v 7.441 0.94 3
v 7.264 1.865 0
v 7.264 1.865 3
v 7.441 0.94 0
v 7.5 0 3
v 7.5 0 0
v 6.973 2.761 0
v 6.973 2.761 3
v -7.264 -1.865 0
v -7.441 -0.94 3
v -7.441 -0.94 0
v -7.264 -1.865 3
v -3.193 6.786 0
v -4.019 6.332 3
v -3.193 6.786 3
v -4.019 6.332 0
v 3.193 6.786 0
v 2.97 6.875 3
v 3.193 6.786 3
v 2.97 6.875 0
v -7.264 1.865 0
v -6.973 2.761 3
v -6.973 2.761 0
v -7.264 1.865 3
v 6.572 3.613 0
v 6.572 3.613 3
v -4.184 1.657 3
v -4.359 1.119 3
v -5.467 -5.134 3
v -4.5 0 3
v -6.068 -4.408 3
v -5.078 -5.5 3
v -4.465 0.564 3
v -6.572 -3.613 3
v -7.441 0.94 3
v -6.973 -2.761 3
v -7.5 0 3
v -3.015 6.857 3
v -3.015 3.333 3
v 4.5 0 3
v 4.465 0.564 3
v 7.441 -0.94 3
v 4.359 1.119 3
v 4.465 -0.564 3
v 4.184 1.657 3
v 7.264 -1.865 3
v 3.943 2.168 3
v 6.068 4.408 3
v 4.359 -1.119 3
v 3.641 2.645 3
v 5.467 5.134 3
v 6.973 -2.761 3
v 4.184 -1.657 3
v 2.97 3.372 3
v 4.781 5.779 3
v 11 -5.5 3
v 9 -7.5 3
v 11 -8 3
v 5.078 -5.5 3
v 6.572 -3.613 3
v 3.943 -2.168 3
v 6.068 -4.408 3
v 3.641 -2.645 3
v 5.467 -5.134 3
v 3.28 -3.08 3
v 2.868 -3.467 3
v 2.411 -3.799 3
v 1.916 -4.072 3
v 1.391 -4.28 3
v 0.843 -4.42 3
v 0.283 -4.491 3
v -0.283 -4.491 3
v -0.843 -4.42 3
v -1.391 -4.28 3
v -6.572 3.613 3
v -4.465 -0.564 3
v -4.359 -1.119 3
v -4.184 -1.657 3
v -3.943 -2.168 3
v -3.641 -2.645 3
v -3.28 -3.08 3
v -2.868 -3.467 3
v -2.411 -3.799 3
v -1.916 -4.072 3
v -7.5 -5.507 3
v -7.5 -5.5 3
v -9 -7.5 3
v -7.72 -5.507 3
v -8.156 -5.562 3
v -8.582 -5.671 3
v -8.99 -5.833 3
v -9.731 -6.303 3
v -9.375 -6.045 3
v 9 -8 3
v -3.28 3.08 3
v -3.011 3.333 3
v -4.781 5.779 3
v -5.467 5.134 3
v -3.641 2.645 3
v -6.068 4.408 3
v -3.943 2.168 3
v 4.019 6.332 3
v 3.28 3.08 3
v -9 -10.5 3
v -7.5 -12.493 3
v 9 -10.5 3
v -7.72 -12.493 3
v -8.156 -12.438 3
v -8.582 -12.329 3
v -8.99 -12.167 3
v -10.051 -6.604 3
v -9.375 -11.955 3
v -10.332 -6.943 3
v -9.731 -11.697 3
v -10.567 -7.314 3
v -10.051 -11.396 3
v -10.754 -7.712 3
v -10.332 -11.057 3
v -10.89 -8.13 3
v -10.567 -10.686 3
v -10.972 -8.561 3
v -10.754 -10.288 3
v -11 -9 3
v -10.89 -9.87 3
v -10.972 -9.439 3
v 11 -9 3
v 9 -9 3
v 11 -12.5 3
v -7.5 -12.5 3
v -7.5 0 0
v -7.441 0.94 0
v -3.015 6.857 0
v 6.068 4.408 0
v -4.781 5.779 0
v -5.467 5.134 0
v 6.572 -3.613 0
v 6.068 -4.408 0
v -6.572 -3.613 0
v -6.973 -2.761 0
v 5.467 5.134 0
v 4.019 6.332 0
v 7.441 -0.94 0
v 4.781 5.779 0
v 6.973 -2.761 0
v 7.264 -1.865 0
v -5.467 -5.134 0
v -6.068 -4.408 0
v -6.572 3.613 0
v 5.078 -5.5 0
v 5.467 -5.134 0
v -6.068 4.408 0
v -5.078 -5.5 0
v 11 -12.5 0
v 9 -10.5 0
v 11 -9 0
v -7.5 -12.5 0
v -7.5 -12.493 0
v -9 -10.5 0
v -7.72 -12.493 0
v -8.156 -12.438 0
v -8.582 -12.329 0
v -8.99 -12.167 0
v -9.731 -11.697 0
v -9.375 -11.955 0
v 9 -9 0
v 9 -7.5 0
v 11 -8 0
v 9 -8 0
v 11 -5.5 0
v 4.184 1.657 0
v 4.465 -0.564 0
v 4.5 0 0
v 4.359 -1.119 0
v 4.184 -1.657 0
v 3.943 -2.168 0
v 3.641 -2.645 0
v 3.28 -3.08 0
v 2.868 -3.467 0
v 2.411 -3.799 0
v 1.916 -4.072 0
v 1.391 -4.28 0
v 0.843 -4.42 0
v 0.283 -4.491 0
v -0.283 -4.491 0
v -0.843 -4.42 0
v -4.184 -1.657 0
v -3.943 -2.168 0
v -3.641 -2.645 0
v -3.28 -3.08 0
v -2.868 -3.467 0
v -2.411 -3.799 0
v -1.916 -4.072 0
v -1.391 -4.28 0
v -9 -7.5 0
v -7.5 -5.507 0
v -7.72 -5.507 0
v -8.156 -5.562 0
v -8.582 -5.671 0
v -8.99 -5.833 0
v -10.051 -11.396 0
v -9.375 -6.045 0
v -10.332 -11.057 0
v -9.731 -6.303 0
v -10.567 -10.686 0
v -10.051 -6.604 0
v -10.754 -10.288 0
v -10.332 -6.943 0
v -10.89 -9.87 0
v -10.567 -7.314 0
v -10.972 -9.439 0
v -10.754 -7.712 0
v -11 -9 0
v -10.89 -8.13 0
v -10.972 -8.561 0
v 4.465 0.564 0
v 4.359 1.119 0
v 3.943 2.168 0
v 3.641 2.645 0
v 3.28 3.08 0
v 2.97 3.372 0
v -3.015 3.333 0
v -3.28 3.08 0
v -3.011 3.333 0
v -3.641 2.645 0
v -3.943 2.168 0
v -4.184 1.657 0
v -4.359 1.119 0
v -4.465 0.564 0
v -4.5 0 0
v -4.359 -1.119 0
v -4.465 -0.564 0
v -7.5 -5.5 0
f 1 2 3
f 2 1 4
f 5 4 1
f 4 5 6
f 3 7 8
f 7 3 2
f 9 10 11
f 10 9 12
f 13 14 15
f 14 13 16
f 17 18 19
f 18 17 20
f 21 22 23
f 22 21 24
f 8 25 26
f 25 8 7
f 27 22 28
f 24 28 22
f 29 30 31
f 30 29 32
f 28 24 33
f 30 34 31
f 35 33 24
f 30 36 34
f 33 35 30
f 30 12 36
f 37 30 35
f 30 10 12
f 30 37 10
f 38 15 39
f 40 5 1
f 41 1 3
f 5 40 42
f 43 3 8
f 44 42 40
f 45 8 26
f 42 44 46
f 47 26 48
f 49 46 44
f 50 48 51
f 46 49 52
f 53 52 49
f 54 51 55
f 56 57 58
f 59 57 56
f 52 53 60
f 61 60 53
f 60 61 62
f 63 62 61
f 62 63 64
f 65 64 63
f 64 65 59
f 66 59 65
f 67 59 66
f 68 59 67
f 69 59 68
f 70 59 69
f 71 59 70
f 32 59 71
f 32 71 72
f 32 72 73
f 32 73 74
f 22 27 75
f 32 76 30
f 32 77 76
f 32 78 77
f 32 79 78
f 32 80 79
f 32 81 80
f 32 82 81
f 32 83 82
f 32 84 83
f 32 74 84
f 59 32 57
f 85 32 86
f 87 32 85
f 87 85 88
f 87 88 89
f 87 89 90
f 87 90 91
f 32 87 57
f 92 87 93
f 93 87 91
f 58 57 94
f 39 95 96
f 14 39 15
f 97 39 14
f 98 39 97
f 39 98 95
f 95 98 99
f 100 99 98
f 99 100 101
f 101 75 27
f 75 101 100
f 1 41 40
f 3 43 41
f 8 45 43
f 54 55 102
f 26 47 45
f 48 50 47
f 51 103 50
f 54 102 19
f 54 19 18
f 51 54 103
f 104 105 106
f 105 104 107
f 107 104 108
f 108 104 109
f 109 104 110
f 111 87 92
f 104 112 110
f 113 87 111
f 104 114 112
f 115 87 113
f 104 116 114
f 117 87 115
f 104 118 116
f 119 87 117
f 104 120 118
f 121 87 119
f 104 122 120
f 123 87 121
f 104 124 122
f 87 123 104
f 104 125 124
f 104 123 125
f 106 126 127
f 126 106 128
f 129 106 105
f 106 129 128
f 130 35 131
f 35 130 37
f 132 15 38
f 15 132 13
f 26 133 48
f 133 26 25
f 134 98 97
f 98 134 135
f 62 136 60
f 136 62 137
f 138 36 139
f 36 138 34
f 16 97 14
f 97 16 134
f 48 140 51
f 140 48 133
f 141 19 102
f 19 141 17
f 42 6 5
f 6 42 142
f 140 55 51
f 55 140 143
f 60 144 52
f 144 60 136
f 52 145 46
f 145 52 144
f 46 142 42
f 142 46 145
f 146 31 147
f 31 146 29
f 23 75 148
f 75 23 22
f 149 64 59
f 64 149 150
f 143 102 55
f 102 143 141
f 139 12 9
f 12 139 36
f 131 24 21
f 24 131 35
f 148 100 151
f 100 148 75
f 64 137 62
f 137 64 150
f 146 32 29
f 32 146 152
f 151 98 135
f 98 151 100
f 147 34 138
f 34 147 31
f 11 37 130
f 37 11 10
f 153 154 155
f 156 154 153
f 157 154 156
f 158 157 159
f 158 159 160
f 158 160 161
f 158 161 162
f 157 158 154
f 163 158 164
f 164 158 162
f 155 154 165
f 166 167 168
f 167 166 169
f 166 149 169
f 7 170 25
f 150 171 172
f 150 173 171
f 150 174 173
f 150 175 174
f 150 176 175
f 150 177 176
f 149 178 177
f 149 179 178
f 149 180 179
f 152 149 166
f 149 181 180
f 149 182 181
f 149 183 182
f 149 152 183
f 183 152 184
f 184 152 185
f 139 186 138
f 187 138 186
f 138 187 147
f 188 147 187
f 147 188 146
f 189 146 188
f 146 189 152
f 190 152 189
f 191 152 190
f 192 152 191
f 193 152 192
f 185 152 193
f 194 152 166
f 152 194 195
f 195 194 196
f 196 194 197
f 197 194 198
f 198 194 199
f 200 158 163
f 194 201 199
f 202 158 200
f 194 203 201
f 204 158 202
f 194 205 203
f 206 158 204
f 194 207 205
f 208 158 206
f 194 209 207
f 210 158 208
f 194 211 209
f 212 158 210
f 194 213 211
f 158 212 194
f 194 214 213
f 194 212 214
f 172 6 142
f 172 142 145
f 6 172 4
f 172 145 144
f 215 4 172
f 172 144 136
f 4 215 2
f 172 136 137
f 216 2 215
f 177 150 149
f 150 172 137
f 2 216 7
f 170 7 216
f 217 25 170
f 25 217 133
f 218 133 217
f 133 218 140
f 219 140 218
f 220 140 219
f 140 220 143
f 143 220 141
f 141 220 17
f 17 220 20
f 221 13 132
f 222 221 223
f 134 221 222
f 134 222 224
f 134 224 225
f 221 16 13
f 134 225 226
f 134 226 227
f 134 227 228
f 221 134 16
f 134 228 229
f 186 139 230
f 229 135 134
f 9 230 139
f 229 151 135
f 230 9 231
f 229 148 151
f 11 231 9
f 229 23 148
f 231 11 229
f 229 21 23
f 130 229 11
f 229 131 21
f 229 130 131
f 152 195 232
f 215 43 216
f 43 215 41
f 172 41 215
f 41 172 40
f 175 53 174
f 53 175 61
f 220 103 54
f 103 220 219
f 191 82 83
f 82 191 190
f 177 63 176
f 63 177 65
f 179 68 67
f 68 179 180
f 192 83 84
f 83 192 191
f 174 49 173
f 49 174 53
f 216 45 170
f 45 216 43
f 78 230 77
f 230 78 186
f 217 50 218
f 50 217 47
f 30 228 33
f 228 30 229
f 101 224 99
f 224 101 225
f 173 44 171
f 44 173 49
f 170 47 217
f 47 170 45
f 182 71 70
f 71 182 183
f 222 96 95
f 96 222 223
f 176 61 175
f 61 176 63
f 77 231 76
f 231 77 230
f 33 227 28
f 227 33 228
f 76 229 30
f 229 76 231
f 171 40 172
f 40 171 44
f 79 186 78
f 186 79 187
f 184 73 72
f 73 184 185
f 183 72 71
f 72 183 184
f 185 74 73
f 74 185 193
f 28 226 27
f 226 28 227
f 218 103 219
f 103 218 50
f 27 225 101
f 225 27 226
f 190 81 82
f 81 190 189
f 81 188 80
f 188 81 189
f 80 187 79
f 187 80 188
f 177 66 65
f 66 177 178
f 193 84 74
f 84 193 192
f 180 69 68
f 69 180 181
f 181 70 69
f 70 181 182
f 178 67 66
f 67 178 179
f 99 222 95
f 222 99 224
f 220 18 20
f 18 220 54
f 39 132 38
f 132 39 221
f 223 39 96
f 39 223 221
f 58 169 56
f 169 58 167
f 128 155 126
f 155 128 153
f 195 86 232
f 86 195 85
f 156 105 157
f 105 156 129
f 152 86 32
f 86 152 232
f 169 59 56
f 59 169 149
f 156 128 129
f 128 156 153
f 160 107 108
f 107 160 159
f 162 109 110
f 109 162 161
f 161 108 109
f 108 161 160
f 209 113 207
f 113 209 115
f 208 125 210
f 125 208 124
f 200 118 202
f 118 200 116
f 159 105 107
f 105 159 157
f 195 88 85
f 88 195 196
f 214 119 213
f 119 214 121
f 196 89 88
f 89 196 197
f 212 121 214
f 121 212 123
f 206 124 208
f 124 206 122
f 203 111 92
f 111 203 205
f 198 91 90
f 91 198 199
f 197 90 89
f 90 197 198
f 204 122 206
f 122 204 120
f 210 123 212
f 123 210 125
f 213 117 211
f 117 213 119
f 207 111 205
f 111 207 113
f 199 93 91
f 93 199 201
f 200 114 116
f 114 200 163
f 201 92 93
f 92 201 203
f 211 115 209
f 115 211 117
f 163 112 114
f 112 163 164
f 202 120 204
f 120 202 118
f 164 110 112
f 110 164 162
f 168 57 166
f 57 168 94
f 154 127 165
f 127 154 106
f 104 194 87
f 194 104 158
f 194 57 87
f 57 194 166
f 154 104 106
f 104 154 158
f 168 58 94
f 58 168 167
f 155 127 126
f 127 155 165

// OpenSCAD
cableWidth=16;  // in mm
rodDelimiter=10; // in mm

// No more changes from here

outerRadius=(rodDelimiter-1+6)/2;
innerRadius=(rodDelimiter-1)/2;

difference() {
    cylinder (r=outerRadius, h=3, $fn=50); 
    cylinder (r=innerRadius, h=3, $fn=50);
    translate ([innerRadius*-0.67, innerRadius/1.35, 0]) cube ([innerRadius*1.33, outerRadius-((rodDelimiter-1)/2.7), 3]);

    
}

difference() {
    union() {
        translate ([(cableWidth-1)/-2, (outerRadius-2+7)*-1, 0]) cube ([(cableWidth+2.5), 7, 3]);
        translate ([(cableWidth-1)/-2, (outerRadius-2+3.5)*-1, 0]) cylinder (r=3.5, h=3, $fn=50);
    }
    translate ([(cableWidth/2+1)*-1, (outerRadius-2+5)*-1, 0]) cube ([(cableWidth+2), 3, 3]);
    translate ([(cableWidth/2+1), (outerRadius-2+3.5)*-1, 0]) cube ([2, 1, 3]);
}
